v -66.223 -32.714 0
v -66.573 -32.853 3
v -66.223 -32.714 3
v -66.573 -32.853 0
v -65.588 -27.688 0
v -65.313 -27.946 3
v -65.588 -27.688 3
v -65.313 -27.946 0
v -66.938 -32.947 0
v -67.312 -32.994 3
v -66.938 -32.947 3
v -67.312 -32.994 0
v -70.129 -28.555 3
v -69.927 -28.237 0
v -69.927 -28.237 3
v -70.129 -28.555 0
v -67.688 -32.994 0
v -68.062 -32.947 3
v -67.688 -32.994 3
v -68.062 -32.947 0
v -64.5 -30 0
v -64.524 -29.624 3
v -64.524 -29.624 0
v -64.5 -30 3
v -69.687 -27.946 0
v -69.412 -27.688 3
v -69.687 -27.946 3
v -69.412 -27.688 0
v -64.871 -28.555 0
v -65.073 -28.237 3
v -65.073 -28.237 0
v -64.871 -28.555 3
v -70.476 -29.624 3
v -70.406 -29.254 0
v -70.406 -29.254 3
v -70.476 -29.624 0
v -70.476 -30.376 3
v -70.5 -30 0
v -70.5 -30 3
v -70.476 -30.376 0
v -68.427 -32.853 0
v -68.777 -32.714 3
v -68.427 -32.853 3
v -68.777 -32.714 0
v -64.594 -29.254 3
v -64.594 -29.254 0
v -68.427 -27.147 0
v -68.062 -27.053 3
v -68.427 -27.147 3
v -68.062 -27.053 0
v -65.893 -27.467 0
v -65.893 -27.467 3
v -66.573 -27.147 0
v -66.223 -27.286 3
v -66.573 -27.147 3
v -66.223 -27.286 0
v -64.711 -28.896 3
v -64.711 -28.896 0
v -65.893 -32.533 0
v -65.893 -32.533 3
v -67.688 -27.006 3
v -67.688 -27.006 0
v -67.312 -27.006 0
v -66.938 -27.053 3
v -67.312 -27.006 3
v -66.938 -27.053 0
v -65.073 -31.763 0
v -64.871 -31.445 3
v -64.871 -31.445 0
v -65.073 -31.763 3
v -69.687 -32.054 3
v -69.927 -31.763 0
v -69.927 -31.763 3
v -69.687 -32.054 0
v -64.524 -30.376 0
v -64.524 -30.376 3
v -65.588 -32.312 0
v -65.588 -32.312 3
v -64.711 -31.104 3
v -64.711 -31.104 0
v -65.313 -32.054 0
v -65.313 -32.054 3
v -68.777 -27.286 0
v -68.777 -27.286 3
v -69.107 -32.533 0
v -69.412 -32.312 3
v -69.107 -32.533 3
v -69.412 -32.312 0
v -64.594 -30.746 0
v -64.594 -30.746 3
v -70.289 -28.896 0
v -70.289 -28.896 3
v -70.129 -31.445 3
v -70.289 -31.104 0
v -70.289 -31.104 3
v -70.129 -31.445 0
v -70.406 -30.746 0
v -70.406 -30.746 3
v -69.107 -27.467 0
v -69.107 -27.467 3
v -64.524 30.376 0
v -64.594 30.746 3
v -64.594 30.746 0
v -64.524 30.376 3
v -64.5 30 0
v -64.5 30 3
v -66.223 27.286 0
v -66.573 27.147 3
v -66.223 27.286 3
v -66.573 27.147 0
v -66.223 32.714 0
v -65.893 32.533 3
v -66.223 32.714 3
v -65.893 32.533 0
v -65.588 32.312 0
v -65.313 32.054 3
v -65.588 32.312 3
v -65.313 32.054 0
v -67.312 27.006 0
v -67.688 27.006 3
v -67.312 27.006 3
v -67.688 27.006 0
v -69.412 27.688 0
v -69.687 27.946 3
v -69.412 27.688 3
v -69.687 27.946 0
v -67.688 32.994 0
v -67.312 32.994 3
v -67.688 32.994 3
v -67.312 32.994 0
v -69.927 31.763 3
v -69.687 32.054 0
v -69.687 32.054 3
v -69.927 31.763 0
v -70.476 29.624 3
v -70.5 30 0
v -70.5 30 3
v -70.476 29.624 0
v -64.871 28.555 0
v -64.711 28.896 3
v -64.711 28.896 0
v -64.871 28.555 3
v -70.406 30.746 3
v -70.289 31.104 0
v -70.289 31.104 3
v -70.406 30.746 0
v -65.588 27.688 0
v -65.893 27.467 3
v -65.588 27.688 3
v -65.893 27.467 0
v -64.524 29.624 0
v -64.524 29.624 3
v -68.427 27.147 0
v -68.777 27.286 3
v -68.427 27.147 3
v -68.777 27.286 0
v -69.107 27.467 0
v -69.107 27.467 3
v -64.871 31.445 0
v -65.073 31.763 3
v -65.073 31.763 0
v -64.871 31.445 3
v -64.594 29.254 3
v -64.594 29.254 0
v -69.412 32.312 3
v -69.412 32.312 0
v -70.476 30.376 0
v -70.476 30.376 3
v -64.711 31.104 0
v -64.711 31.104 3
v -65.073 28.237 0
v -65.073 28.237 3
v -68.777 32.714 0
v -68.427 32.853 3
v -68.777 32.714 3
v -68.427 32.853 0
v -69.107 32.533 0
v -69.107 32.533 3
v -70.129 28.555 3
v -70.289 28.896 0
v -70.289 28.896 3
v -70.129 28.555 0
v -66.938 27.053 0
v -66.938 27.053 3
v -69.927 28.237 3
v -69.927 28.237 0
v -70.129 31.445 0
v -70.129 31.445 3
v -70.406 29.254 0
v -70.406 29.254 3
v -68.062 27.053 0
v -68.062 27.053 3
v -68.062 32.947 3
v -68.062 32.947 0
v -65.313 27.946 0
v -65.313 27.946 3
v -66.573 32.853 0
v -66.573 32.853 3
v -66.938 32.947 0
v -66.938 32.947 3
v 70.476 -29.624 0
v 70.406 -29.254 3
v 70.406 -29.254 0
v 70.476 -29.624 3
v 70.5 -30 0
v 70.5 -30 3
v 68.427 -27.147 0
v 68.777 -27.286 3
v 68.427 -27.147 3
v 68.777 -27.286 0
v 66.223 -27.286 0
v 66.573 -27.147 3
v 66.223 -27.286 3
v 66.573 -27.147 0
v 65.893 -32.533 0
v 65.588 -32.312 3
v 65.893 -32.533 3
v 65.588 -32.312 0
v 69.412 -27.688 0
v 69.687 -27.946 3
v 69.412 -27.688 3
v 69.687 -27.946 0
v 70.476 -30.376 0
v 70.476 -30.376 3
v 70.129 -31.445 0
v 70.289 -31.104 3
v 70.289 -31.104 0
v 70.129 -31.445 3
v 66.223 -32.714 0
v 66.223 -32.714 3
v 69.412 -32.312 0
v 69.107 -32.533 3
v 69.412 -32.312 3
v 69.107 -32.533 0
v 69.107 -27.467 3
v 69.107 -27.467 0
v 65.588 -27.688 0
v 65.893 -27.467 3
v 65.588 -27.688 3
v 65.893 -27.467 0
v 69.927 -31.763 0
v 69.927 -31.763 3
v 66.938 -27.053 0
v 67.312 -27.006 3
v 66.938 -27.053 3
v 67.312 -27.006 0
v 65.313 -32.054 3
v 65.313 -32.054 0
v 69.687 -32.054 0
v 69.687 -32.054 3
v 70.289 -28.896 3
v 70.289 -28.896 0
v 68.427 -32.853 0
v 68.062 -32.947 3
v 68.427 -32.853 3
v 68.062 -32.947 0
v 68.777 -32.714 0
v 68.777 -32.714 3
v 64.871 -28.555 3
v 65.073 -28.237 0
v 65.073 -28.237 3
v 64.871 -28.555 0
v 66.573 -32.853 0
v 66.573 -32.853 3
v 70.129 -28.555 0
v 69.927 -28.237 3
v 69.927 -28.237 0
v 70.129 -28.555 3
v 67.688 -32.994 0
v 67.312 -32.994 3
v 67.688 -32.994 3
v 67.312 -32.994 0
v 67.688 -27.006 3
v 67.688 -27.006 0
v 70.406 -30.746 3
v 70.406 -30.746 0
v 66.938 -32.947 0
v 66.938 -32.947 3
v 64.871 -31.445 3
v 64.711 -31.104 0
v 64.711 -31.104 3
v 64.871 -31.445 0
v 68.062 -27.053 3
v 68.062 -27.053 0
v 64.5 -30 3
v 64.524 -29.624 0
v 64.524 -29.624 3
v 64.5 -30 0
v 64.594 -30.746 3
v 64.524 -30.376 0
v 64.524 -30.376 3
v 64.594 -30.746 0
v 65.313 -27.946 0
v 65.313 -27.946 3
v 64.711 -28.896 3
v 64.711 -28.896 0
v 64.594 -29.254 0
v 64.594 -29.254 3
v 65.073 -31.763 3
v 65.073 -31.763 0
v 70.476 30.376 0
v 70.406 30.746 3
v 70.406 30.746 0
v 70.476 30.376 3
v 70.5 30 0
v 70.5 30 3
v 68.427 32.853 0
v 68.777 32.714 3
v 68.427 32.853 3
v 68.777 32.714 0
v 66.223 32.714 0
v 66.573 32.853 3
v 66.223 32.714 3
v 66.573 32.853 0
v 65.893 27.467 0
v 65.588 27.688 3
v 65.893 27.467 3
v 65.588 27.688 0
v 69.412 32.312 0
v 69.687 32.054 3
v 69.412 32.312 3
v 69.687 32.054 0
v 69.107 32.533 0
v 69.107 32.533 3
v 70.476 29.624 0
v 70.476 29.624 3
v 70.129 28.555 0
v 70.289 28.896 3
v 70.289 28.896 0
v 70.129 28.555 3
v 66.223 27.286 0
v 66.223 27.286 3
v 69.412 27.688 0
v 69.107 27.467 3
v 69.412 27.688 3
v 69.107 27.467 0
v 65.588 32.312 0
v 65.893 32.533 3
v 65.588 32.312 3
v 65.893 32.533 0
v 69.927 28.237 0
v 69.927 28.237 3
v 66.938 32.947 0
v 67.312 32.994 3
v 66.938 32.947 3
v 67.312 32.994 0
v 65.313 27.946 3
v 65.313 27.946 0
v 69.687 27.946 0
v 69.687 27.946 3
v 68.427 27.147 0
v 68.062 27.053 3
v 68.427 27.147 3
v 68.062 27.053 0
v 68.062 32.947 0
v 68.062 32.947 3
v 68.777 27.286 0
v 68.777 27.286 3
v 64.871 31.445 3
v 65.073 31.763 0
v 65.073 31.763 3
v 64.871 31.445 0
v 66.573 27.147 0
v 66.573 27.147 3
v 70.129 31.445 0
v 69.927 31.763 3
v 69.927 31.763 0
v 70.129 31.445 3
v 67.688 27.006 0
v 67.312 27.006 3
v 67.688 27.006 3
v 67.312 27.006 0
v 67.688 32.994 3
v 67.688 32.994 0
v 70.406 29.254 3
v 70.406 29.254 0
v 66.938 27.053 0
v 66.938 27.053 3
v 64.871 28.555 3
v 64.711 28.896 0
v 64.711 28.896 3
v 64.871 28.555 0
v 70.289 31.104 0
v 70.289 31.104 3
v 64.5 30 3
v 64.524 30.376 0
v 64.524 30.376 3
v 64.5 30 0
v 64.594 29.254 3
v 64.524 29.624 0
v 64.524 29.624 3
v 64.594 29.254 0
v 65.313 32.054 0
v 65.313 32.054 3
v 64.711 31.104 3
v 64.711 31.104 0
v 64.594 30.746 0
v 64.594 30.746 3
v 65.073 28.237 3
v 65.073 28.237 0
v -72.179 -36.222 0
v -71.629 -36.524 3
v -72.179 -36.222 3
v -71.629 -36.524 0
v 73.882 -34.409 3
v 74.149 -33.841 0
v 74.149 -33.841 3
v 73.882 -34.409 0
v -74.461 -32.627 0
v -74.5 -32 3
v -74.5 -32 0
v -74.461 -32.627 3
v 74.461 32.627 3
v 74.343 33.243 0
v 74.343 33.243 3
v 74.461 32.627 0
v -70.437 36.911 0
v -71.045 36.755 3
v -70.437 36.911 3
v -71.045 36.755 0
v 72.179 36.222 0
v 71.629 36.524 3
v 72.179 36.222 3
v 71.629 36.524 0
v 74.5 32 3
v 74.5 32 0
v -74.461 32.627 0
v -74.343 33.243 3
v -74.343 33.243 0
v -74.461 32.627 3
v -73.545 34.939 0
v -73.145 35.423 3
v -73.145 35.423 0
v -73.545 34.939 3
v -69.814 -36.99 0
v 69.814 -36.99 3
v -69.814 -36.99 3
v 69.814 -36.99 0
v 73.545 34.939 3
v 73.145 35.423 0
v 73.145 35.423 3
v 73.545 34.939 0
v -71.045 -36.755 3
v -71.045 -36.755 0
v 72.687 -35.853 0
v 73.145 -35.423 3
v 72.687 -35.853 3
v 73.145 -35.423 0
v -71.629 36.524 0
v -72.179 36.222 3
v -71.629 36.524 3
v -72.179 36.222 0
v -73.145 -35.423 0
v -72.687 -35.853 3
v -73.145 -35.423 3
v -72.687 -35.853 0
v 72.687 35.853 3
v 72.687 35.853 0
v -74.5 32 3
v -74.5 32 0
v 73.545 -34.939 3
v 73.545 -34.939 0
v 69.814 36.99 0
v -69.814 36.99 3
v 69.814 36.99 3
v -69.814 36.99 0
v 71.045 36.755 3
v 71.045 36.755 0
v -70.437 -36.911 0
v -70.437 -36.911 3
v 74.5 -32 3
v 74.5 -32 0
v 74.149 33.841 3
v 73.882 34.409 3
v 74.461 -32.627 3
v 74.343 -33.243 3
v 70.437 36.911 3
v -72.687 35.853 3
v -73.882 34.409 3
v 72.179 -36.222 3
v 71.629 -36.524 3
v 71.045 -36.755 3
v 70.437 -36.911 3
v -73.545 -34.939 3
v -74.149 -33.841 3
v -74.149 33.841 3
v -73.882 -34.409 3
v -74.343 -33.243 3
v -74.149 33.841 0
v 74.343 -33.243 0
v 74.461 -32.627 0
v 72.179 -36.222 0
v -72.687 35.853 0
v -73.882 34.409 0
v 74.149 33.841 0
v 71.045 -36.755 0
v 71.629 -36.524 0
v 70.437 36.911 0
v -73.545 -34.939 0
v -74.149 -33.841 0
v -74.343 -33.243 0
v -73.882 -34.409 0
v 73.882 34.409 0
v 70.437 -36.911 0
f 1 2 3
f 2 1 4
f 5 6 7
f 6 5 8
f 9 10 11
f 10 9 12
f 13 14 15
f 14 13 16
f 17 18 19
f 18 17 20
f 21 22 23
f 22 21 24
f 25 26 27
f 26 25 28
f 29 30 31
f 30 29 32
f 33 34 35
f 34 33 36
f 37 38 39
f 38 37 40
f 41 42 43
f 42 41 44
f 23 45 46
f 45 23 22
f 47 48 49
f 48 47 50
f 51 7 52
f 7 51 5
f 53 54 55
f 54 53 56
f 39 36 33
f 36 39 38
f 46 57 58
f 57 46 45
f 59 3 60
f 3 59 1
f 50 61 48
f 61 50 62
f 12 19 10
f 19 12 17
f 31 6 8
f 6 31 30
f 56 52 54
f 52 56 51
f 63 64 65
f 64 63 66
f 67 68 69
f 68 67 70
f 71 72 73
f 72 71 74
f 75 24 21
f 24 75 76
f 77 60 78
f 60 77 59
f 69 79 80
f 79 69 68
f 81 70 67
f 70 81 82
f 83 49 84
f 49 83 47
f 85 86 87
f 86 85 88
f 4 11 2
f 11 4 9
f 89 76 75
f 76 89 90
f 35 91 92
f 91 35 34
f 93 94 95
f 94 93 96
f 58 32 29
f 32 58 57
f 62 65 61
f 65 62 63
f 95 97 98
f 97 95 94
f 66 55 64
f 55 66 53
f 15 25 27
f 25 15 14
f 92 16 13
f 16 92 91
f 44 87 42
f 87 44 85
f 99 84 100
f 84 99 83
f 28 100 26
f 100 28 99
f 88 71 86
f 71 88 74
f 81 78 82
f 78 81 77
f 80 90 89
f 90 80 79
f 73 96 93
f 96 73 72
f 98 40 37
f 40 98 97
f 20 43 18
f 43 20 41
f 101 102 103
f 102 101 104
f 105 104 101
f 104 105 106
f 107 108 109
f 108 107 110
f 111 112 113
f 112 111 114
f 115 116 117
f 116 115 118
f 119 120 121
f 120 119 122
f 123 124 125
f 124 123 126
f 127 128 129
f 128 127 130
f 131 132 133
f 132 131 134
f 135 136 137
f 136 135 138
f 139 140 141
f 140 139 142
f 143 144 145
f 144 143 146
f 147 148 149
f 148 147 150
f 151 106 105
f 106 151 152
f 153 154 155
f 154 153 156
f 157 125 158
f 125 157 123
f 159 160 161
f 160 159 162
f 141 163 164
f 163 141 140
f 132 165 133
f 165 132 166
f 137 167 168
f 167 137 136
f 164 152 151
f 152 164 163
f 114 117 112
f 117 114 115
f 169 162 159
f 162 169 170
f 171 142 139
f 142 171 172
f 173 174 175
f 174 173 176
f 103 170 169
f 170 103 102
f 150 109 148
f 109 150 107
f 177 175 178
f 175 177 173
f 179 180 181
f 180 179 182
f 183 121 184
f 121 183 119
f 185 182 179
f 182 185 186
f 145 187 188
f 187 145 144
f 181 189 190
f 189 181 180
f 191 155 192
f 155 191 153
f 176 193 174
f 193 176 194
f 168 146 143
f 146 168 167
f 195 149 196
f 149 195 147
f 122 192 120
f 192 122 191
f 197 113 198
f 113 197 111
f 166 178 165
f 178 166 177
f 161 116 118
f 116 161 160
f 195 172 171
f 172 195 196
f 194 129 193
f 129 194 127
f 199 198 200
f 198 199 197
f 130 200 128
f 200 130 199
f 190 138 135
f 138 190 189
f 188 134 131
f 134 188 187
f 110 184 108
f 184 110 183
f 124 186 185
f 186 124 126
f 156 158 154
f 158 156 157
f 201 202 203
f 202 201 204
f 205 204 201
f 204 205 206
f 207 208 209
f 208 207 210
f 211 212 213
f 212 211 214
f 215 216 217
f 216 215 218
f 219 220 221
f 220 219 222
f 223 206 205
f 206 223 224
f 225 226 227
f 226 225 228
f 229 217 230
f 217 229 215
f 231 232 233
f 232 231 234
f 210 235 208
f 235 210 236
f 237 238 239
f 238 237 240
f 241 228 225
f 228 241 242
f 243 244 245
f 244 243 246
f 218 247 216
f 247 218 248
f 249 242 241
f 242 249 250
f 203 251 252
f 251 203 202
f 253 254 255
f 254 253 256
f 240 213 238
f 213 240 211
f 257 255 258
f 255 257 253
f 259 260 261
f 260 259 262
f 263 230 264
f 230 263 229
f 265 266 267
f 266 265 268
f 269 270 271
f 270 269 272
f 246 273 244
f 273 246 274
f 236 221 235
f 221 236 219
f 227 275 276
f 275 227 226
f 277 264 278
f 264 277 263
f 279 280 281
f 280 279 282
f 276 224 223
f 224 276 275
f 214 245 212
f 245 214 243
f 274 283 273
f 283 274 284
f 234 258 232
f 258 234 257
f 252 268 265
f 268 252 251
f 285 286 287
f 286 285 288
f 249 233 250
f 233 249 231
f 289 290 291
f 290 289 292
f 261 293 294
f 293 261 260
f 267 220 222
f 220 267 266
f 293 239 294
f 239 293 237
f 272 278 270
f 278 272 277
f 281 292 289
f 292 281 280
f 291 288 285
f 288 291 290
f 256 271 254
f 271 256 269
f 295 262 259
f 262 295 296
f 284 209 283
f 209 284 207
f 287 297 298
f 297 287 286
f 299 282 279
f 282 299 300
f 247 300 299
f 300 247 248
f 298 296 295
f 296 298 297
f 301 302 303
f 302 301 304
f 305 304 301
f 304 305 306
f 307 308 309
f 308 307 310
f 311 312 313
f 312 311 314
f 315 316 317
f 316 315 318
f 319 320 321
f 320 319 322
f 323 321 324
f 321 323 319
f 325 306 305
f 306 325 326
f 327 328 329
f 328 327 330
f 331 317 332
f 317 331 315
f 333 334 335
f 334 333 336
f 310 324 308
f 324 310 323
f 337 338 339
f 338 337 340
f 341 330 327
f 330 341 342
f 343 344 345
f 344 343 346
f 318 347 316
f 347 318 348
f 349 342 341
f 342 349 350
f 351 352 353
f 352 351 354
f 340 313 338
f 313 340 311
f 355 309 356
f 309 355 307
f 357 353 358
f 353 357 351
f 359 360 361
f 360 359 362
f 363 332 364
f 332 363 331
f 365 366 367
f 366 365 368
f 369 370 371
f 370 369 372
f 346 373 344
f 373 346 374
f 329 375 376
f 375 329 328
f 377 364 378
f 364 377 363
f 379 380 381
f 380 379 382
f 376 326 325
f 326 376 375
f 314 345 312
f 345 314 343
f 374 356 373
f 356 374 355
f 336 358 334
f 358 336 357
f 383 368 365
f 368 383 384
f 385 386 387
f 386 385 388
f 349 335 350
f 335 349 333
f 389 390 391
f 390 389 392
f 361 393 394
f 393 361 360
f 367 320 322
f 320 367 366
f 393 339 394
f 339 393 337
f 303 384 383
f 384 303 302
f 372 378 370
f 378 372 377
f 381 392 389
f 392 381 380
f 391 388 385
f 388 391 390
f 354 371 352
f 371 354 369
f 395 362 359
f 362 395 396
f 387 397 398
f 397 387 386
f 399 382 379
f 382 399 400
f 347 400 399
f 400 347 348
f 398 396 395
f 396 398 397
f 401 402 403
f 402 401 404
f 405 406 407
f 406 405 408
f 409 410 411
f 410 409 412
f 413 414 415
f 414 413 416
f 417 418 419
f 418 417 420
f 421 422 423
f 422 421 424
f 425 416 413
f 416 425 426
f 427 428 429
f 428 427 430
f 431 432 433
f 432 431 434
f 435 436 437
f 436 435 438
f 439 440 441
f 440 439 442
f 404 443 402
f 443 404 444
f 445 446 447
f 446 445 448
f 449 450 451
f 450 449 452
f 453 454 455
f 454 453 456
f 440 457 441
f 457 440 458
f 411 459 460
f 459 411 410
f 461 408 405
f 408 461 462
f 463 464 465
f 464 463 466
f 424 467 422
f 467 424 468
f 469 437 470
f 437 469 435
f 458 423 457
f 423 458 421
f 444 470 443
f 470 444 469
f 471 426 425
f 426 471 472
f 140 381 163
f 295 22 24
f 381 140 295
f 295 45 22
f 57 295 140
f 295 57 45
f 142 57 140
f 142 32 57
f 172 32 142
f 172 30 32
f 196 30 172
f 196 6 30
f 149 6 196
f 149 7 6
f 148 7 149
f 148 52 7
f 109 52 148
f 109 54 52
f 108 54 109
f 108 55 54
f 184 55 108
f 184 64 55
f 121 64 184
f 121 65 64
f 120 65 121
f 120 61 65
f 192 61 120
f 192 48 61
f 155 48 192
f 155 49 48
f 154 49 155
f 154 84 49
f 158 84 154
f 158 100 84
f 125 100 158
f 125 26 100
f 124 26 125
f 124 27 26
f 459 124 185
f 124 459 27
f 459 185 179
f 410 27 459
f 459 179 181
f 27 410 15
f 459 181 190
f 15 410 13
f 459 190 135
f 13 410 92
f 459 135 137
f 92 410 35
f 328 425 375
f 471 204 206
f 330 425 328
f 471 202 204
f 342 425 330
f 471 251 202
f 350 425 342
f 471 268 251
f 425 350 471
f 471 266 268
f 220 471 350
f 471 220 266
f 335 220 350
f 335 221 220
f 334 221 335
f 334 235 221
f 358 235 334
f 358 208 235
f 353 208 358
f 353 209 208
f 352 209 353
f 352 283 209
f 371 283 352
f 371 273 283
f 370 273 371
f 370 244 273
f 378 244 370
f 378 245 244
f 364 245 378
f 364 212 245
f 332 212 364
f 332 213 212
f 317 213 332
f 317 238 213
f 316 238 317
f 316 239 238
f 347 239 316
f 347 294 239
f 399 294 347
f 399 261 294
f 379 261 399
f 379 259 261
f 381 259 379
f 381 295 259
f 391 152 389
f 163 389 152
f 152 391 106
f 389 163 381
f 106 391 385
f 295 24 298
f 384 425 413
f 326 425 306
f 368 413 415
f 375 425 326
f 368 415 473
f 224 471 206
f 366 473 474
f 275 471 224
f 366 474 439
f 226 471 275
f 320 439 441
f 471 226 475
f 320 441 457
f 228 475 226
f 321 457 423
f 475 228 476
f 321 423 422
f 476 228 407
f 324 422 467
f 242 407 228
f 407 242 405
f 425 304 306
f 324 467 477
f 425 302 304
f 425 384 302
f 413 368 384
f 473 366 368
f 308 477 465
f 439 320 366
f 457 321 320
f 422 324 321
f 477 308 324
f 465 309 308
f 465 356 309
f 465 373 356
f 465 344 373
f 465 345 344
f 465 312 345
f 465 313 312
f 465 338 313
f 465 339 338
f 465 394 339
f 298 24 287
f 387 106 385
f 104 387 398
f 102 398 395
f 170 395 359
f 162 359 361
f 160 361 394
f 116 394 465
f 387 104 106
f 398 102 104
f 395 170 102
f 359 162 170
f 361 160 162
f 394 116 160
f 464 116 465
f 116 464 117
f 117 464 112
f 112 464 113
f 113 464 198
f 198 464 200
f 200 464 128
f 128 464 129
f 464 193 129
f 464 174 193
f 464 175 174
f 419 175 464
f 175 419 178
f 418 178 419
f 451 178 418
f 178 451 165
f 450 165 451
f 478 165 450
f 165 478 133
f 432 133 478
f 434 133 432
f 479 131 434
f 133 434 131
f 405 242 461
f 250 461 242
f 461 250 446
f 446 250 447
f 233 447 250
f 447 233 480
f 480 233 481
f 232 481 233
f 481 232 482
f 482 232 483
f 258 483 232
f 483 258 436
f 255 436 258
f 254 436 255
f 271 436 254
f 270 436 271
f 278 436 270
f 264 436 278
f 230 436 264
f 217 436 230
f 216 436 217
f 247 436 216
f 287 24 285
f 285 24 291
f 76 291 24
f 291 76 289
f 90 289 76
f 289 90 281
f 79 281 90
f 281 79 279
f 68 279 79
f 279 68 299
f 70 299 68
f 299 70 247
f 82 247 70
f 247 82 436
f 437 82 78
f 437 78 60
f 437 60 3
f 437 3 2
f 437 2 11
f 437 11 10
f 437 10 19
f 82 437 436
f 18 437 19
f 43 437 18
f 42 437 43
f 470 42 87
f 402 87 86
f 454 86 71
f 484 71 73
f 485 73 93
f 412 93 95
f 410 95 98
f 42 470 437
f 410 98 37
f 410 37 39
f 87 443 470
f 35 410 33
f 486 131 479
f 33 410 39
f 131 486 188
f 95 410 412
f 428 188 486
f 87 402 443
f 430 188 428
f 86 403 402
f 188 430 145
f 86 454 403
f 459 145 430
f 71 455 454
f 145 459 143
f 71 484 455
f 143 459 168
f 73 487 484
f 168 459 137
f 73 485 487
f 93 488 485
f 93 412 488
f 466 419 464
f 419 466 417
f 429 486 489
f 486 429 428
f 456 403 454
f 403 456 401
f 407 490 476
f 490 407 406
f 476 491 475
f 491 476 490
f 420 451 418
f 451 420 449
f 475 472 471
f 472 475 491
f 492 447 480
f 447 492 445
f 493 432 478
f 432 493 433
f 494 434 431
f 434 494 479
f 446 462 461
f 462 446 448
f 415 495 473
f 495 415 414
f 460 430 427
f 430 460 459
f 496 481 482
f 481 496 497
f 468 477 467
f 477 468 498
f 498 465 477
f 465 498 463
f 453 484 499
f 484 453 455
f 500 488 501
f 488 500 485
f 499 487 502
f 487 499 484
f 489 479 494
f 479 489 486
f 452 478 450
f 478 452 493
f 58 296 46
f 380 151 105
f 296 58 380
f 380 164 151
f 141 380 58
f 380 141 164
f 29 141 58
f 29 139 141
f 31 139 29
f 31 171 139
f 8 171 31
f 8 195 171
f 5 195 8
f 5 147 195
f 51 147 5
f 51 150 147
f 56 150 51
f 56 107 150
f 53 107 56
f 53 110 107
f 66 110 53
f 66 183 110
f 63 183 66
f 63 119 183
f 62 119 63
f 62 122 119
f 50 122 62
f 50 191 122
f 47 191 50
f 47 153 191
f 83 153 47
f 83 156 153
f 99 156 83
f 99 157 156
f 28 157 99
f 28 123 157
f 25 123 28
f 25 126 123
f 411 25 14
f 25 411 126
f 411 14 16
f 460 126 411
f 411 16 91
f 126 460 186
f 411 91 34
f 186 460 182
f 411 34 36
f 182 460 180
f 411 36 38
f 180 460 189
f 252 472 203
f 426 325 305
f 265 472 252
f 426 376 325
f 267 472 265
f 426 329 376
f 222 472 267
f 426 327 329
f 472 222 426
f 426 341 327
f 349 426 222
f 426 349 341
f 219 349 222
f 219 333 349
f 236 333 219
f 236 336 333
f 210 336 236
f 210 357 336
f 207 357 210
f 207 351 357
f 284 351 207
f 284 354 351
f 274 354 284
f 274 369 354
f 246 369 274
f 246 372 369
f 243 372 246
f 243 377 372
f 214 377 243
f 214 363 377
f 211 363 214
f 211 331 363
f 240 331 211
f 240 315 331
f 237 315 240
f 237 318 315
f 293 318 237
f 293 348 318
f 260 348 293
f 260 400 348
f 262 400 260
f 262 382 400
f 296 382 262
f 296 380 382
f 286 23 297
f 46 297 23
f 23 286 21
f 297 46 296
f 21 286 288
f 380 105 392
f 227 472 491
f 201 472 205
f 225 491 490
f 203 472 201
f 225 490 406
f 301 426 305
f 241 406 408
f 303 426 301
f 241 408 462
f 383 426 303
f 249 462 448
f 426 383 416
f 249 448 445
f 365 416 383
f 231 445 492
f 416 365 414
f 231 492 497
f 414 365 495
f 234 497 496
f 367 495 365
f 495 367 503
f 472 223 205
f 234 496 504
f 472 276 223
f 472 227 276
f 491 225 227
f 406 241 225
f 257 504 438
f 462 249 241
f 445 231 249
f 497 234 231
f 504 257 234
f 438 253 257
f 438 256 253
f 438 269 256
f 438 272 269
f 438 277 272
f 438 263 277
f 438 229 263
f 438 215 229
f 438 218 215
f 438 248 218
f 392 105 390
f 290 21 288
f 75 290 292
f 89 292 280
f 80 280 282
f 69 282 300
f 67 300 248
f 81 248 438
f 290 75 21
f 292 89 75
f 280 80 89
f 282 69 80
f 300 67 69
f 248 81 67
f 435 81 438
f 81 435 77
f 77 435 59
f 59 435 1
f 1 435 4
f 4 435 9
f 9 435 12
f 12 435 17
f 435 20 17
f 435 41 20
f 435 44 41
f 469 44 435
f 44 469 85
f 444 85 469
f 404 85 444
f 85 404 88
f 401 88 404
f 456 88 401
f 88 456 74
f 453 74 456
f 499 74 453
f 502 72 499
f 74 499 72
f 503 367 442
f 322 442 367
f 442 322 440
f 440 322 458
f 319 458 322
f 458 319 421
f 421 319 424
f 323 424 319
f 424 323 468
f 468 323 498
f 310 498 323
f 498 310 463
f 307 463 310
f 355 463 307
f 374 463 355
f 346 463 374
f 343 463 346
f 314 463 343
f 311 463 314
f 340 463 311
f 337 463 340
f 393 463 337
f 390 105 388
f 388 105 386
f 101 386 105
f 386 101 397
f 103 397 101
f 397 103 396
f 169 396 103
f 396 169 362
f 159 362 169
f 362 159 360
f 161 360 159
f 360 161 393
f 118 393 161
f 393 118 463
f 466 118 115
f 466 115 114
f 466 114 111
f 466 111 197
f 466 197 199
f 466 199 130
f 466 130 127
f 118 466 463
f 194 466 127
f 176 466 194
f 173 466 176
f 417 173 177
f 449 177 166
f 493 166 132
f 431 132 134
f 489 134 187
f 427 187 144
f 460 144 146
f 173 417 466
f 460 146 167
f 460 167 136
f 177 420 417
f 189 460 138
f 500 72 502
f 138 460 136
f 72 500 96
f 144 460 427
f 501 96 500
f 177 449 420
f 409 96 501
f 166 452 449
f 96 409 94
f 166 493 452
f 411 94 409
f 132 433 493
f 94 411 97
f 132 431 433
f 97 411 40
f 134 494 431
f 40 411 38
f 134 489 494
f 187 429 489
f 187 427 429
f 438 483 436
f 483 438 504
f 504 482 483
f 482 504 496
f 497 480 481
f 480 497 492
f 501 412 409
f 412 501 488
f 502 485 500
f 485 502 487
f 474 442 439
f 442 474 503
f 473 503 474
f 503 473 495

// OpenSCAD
$fn = 50;


difference() {
	union() {
		hull() {
			translate(v = [-69.5000000000, 32.0000000000, 0]) {
				cylinder(h = 3, r = 5);
			}
			translate(v = [69.5000000000, 32.0000000000, 0]) {
				cylinder(h = 3, r = 5);
			}
			translate(v = [-69.5000000000, -32.0000000000, 0]) {
				cylinder(h = 3, r = 5);
			}
			translate(v = [69.5000000000, -32.0000000000, 0]) {
				cylinder(h = 3, r = 5);
			}
		}
	}
	union() {
		translate(v = [-67.5000000000, -30.0000000000, -100.0000000000]) {
			cylinder(h = 200, r = 3.0000000000);
		}
		translate(v = [-67.5000000000, 30.0000000000, -100.0000000000]) {
			cylinder(h = 200, r = 3.0000000000);
		}
		translate(v = [67.5000000000, -30.0000000000, -100.0000000000]) {
			cylinder(h = 200, r = 3.0000000000);
		}
		translate(v = [67.5000000000, 30.0000000000, -100.0000000000]) {
			cylinder(h = 200, r = 3.0000000000);
		}
	}
}
